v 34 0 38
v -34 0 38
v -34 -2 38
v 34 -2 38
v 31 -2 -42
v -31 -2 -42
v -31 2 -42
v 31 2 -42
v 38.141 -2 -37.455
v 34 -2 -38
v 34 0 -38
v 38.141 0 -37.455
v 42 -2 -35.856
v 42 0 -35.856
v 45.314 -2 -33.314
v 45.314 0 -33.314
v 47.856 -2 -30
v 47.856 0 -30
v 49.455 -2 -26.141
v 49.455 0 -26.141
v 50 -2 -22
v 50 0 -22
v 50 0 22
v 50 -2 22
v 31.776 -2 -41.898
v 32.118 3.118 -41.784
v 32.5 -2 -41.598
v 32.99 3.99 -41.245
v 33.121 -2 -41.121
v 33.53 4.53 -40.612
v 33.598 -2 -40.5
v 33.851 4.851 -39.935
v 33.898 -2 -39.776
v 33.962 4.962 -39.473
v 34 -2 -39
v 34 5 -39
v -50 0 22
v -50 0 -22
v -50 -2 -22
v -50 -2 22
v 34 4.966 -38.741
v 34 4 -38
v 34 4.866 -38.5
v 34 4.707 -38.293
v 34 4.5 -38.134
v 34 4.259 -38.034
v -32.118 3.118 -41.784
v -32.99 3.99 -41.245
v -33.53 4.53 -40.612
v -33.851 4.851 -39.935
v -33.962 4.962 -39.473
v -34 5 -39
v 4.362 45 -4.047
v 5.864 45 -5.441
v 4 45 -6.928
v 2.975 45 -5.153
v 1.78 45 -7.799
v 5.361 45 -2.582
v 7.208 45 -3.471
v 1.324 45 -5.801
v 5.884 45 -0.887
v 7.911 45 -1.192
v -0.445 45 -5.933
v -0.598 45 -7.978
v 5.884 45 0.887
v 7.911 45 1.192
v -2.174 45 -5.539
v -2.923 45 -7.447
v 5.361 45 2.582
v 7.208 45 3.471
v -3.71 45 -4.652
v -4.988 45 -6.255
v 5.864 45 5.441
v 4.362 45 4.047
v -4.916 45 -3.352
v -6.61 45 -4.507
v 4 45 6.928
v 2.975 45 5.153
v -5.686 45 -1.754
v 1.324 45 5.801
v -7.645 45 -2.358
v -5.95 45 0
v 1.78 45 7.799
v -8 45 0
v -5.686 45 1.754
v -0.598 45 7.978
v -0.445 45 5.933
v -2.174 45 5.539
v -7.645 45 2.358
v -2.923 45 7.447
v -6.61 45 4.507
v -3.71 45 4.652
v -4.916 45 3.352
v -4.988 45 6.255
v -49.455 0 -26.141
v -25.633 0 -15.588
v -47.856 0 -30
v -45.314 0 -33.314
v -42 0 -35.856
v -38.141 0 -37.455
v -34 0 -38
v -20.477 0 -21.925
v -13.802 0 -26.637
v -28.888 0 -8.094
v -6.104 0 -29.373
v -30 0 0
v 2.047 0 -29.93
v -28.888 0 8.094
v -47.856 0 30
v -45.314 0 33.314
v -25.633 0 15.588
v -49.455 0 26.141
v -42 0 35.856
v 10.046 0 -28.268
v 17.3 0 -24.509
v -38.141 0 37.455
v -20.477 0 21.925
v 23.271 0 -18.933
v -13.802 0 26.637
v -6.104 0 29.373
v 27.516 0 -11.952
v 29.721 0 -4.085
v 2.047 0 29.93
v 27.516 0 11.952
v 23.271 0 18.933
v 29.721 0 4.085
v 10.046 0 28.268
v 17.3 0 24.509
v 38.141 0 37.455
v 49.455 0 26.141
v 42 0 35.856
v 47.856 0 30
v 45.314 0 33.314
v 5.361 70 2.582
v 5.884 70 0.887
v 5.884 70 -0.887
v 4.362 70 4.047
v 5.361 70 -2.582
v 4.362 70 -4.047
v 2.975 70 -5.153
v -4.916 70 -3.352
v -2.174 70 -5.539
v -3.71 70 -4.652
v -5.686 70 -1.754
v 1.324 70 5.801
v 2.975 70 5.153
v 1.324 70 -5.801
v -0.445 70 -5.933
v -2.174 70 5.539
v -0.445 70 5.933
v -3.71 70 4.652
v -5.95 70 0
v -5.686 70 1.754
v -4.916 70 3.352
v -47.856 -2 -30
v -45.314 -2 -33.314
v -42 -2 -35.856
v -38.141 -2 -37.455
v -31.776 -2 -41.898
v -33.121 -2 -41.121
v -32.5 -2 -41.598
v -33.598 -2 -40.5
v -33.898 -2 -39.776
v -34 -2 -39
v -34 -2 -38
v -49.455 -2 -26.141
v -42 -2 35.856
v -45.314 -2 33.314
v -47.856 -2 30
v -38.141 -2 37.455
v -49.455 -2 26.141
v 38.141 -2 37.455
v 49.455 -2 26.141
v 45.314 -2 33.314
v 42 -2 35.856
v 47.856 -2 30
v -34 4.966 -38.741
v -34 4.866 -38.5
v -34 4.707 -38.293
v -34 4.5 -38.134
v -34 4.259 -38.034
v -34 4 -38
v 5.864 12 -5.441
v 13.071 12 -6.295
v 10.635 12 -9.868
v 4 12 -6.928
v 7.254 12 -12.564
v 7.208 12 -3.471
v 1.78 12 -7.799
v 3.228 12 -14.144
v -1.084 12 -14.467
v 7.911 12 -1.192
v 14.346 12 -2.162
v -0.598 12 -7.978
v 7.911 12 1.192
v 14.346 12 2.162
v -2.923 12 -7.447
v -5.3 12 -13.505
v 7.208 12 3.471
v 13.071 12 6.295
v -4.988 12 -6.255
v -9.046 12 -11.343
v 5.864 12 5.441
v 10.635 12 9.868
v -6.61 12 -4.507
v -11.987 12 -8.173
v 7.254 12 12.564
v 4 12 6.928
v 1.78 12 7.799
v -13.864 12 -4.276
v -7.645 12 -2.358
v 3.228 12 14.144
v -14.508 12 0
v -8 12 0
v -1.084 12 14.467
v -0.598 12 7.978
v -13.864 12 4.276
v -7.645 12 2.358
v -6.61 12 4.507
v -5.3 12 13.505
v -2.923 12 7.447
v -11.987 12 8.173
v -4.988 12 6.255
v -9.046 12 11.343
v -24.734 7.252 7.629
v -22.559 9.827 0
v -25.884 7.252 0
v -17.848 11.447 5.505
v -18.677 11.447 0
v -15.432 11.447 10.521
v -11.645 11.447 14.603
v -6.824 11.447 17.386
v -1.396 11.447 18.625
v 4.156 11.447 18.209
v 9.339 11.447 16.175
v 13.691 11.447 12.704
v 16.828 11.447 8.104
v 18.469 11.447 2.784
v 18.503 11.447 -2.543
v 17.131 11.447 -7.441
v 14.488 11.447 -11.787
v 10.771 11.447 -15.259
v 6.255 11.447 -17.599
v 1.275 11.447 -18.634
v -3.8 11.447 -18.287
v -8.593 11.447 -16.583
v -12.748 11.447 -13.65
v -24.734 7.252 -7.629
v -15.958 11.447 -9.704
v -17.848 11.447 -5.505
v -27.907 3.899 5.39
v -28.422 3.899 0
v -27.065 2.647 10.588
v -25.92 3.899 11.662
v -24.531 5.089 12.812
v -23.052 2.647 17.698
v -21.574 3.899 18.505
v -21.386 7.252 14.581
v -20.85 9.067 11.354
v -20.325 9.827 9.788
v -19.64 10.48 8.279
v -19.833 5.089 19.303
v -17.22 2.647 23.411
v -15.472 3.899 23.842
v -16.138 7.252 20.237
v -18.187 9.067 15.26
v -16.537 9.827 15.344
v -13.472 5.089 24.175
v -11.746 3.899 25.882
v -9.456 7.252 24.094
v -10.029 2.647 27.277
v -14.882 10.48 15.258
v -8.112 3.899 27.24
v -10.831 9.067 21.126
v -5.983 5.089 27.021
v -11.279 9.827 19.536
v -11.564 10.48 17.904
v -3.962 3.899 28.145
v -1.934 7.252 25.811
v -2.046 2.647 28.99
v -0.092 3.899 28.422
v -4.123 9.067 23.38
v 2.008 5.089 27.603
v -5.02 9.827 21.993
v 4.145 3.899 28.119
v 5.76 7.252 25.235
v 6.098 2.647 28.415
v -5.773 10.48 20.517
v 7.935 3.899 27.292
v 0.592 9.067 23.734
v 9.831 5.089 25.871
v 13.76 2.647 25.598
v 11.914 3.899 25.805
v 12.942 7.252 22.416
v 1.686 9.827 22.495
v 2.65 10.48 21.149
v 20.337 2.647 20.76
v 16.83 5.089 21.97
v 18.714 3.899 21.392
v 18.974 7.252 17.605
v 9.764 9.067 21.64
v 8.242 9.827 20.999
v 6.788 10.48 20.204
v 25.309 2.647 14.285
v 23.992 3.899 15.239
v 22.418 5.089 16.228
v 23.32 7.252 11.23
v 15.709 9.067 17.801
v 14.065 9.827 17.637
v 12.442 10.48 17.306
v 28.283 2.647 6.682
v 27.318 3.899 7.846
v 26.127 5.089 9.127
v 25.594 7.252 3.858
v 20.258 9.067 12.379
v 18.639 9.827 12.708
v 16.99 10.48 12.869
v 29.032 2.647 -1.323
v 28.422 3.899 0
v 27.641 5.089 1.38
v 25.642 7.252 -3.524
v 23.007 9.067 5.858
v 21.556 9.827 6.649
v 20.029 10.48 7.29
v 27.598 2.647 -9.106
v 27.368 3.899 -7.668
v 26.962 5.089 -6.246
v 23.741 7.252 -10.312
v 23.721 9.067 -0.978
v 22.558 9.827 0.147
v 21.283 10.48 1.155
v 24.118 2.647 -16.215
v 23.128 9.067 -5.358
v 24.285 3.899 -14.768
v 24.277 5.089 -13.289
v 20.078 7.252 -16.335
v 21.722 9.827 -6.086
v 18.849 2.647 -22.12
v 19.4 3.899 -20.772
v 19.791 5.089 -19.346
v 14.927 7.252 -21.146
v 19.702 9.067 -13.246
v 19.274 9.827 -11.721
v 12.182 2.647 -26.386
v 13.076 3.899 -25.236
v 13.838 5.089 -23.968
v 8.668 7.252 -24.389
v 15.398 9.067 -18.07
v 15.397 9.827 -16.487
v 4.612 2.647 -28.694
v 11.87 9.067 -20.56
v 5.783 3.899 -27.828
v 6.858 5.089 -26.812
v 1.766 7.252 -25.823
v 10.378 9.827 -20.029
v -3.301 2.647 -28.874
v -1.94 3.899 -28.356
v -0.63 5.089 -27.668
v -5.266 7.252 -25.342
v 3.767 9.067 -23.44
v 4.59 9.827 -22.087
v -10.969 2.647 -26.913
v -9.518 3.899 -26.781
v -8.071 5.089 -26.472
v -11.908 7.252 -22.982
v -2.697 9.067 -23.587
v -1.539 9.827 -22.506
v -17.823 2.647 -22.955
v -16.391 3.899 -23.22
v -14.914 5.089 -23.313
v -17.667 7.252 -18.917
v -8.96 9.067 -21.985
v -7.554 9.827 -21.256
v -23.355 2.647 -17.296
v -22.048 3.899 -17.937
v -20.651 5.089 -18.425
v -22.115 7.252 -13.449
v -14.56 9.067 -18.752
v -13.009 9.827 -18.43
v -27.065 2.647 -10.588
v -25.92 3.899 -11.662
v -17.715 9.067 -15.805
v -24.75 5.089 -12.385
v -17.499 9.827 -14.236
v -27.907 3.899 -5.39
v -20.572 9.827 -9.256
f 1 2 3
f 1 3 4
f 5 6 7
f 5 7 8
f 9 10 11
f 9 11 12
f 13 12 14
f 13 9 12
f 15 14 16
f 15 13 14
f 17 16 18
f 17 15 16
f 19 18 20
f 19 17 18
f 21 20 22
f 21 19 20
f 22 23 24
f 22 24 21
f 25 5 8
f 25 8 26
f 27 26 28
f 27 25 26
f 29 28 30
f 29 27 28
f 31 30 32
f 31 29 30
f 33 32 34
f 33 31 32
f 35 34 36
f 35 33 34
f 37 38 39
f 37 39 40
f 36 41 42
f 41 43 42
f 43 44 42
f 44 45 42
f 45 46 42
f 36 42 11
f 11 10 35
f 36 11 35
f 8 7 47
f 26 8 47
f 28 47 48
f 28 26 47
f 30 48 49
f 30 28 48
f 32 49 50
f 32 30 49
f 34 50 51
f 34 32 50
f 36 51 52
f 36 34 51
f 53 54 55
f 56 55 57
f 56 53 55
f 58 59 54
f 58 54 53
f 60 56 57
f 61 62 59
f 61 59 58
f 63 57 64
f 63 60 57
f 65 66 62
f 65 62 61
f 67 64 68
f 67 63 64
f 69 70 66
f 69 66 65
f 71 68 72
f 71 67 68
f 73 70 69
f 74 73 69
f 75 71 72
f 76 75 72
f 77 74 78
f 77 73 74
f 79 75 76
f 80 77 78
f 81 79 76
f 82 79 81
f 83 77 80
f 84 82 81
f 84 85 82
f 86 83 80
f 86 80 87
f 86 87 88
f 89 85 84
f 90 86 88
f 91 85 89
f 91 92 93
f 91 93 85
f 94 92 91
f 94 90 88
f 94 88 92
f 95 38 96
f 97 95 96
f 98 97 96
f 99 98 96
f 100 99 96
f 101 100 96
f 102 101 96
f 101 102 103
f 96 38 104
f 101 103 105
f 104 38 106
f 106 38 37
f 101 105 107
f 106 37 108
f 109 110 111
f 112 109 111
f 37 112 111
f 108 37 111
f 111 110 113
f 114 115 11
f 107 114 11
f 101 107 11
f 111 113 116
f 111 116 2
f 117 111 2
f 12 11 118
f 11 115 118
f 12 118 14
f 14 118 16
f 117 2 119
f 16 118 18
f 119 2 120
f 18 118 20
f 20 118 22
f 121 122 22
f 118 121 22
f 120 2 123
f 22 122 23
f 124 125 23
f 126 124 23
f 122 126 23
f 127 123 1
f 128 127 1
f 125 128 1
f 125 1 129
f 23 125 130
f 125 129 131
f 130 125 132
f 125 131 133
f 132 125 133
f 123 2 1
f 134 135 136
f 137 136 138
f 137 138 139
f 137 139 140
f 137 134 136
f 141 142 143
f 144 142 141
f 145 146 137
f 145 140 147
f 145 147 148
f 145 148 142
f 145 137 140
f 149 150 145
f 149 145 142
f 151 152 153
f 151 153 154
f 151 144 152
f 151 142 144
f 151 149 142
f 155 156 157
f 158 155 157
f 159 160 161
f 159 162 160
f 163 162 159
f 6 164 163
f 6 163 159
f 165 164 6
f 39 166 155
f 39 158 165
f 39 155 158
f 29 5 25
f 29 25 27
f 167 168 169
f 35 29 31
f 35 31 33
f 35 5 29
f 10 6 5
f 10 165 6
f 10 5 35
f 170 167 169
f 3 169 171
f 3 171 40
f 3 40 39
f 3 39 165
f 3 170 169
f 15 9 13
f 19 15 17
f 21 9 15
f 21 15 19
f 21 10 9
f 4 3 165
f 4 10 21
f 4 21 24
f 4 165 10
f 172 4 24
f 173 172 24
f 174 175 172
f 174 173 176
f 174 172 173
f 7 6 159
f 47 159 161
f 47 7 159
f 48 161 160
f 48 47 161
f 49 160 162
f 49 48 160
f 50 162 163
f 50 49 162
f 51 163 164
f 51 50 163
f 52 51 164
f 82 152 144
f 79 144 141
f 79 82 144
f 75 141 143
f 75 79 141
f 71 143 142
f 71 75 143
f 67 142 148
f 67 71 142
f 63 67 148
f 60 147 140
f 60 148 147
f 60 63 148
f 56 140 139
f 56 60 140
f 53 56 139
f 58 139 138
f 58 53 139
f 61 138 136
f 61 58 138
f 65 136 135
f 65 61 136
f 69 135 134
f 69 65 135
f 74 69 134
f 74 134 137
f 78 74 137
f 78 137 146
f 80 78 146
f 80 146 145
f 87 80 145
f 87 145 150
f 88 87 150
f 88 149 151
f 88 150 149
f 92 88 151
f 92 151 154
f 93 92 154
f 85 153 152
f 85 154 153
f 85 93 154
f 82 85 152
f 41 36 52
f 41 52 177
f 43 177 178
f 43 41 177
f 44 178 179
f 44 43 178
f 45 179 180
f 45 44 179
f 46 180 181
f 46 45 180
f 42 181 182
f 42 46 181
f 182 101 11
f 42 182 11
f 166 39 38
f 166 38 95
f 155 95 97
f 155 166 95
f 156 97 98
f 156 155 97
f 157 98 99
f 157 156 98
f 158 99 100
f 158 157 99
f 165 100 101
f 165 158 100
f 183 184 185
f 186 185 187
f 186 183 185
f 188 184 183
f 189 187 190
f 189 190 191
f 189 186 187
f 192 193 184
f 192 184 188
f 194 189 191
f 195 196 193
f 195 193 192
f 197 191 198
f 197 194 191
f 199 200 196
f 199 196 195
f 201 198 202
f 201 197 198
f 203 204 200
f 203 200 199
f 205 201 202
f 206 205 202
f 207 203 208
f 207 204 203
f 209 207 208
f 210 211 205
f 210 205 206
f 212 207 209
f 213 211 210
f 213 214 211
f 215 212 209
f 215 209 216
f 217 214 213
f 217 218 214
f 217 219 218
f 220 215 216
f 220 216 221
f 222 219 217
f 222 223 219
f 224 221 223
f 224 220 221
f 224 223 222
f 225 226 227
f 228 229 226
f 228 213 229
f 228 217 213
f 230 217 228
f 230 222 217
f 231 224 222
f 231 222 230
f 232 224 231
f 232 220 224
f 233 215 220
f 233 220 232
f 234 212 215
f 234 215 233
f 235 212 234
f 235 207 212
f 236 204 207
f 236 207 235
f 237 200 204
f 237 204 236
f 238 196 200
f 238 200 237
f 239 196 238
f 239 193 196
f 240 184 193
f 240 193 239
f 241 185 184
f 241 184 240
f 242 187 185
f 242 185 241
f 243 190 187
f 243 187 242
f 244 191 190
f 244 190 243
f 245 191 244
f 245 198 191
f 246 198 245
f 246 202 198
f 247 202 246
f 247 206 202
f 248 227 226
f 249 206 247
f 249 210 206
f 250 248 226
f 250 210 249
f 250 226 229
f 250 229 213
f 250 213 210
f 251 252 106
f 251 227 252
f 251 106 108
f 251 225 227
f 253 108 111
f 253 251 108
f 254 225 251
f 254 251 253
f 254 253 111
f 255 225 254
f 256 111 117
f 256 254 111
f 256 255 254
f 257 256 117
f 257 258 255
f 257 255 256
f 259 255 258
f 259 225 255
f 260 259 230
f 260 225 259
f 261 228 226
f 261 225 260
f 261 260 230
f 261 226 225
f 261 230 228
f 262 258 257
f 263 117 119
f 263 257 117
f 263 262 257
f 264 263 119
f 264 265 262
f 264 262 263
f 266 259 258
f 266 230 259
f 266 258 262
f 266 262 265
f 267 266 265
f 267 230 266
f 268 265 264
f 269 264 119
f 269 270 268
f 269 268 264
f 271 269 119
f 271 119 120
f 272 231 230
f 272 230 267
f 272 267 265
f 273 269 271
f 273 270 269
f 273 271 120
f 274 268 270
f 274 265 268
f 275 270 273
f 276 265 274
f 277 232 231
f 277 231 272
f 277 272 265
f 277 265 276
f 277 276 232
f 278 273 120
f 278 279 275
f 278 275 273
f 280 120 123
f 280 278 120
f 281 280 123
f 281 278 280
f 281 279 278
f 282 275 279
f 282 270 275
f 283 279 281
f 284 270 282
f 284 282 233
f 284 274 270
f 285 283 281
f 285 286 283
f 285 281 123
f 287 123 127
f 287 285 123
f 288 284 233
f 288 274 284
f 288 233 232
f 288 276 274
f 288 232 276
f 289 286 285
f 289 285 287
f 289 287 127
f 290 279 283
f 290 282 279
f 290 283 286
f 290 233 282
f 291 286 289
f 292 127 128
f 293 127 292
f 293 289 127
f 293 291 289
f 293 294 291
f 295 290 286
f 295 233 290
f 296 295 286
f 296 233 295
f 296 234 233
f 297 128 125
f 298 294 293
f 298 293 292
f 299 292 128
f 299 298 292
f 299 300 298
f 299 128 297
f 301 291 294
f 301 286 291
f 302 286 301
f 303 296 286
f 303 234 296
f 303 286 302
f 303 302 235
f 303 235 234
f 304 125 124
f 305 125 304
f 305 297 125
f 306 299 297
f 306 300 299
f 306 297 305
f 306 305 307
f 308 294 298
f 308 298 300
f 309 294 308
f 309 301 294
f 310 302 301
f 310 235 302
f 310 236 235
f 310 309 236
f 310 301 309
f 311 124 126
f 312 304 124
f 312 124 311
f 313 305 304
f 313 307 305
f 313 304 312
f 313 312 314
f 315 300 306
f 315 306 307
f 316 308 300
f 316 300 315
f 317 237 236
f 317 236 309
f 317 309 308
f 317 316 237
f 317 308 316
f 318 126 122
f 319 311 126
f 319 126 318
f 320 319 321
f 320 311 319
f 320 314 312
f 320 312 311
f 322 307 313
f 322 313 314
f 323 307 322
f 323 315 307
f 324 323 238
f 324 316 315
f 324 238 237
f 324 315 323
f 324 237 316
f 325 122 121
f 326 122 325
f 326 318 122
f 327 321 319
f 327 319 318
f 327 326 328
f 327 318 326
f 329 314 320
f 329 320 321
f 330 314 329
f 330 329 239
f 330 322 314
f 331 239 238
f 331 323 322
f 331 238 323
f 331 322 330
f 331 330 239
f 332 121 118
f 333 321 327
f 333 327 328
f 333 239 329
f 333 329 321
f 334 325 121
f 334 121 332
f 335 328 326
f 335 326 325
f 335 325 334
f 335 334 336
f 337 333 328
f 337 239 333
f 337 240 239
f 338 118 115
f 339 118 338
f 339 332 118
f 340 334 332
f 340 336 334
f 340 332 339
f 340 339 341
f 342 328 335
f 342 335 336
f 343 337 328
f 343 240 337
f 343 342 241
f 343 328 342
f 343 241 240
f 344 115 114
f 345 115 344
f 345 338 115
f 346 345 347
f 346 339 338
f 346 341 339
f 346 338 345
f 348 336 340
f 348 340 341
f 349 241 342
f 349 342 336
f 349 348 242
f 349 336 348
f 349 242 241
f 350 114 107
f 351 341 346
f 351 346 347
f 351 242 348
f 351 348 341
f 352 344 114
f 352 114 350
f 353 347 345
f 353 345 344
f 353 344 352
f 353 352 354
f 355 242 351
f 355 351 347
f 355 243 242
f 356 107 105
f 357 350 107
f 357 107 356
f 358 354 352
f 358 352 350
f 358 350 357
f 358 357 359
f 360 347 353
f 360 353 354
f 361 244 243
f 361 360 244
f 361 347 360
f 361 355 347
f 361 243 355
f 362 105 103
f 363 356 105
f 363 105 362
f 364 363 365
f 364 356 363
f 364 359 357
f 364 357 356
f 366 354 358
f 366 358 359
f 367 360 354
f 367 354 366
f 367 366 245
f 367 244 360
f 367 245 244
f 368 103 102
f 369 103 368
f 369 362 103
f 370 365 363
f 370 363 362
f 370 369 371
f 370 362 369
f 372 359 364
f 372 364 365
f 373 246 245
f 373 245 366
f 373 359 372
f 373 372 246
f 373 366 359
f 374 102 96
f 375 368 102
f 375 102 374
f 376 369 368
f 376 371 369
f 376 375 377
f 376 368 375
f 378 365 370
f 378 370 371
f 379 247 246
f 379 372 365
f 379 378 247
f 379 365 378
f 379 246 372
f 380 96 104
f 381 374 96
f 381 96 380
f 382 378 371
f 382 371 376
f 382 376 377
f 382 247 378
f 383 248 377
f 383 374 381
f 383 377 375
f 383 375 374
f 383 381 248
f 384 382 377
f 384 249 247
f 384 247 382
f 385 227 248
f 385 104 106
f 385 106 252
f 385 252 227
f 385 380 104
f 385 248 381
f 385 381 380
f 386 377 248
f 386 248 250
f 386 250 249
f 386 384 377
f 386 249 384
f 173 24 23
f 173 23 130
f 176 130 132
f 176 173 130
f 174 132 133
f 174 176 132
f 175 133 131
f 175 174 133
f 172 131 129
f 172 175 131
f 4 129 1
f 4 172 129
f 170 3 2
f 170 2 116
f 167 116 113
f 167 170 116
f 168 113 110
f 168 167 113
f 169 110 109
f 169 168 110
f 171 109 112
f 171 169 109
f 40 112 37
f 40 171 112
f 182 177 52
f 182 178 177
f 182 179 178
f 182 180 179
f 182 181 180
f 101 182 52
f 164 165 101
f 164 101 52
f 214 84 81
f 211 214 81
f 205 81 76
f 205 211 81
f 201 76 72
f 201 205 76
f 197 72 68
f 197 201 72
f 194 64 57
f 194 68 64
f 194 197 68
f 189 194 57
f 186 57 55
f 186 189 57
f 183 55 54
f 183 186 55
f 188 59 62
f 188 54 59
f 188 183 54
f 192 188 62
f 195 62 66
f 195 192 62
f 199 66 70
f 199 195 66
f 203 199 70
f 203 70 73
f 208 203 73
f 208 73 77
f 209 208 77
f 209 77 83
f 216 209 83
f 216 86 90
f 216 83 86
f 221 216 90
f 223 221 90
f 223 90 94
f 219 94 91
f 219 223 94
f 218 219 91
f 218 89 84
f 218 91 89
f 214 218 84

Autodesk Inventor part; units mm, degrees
ref_plane "YZ Plane" through (0, 0, 0) normal (1, 0, 0) x (0, 1, 0)
ref_plane "XZ Plane" through (0, 0, 0) normal (0, 1, 0) x (-1, 0, 0)
ref_plane "XY Plane" through (0, 0, 0) normal (0, 0, 1) x (1, 0, 0)
sketch "Sketch1" plane through (0, 0, 0) normal (0, 1, 0) x (-1, 0, 0)
  circle A0 centre (0, 0) radius 5.95
  circle A1 centre (0, 0) radius 8
  circle A2 centre (0, 0) radius 30
  dimension "d0" = 11.9
  dimension "d2" = 16
  dimension "d3" = 60
extrude "Extrusion1" add sketch "Sketch1" along normal blind 70 contours A0
extrude "Extrusion2" cut sketch "Sketch1" along normal blind 45 contours A1
extrude "Extrusion3" add sketch "Sketch1" along normal blind 45 contours A0 | A1
extrude "Extrusion4" add sketch "Sketch1" along normal blind 12 contours A2
sketch "Sketch2" plane through (0, 0, 0) normal (0, -1, 0) x (1, 0, 0)
  line L0 (-50, 38) -> (50, 38)
  line L1 (50, 38) -> (50, -38)
  line L2 (50, -38) -> (-50, -38)
  line L3 (-50, -38) -> (-50, 38)
  line L4 (-50, 38) -> (50, -38) construction
  line L5 (50, 38) -> (-50, -38) construction
  point P0 (0, 0)
  dimension "d12" = 100
extrude "Extrusion5" add sketch "Sketch2" along normal blind 2
fillet "Fillet1" radius 16 4 edges at (50, -1, 38) (50, -1, -38) (-50, -1, -38) (-50, -1, 38)
fillet "Fillet2" radius 16 1 edges at (30, 12, 0)
sketch "Sketch3" plane through (34, 0, -38) normal (0, 0, -1) x (-1, 0, 0)
  line L0 (0, 0) -> (68, 0) projected
  line L1 (0, -2) -> (68, -2)
  line L2 (68, -2) -> (68, 0)
  line L3 (68, 0) -> (0, 0)
  line L4 (0, 0) -> (0, -2)
  point P0 (34, 0)
extrude "Extrusion6" add sketch "Sketch3" along normal blind 4
sketch "Sketch4" plane through (0, 0, 0) normal (0, 1, 0) x (1, 0, 0)
  line L0 (-34, 42) -> (34, 42) projected
  line L1 (-34, 38) -> (-34, 42) projected
  line L2 (34, 42) -> (-34, 42)
  line L3 (-34, 42) -> (-34, 38)
  line L4 (-34, 38) -> (34, 38)
  line L5 (34, 38) -> (34, 42)
  point P0 (0, 0)
extrude "Extrusion7" add sketch "Sketch4" along normal blind 5
fillet "Fillet3" radius 3 3 edges at (0, 5, -42) (-34, 1.5, -42) (34, 1.5, -42)
fillet "Fillet4" radius 1 1 edges at (0, 5, -38)
